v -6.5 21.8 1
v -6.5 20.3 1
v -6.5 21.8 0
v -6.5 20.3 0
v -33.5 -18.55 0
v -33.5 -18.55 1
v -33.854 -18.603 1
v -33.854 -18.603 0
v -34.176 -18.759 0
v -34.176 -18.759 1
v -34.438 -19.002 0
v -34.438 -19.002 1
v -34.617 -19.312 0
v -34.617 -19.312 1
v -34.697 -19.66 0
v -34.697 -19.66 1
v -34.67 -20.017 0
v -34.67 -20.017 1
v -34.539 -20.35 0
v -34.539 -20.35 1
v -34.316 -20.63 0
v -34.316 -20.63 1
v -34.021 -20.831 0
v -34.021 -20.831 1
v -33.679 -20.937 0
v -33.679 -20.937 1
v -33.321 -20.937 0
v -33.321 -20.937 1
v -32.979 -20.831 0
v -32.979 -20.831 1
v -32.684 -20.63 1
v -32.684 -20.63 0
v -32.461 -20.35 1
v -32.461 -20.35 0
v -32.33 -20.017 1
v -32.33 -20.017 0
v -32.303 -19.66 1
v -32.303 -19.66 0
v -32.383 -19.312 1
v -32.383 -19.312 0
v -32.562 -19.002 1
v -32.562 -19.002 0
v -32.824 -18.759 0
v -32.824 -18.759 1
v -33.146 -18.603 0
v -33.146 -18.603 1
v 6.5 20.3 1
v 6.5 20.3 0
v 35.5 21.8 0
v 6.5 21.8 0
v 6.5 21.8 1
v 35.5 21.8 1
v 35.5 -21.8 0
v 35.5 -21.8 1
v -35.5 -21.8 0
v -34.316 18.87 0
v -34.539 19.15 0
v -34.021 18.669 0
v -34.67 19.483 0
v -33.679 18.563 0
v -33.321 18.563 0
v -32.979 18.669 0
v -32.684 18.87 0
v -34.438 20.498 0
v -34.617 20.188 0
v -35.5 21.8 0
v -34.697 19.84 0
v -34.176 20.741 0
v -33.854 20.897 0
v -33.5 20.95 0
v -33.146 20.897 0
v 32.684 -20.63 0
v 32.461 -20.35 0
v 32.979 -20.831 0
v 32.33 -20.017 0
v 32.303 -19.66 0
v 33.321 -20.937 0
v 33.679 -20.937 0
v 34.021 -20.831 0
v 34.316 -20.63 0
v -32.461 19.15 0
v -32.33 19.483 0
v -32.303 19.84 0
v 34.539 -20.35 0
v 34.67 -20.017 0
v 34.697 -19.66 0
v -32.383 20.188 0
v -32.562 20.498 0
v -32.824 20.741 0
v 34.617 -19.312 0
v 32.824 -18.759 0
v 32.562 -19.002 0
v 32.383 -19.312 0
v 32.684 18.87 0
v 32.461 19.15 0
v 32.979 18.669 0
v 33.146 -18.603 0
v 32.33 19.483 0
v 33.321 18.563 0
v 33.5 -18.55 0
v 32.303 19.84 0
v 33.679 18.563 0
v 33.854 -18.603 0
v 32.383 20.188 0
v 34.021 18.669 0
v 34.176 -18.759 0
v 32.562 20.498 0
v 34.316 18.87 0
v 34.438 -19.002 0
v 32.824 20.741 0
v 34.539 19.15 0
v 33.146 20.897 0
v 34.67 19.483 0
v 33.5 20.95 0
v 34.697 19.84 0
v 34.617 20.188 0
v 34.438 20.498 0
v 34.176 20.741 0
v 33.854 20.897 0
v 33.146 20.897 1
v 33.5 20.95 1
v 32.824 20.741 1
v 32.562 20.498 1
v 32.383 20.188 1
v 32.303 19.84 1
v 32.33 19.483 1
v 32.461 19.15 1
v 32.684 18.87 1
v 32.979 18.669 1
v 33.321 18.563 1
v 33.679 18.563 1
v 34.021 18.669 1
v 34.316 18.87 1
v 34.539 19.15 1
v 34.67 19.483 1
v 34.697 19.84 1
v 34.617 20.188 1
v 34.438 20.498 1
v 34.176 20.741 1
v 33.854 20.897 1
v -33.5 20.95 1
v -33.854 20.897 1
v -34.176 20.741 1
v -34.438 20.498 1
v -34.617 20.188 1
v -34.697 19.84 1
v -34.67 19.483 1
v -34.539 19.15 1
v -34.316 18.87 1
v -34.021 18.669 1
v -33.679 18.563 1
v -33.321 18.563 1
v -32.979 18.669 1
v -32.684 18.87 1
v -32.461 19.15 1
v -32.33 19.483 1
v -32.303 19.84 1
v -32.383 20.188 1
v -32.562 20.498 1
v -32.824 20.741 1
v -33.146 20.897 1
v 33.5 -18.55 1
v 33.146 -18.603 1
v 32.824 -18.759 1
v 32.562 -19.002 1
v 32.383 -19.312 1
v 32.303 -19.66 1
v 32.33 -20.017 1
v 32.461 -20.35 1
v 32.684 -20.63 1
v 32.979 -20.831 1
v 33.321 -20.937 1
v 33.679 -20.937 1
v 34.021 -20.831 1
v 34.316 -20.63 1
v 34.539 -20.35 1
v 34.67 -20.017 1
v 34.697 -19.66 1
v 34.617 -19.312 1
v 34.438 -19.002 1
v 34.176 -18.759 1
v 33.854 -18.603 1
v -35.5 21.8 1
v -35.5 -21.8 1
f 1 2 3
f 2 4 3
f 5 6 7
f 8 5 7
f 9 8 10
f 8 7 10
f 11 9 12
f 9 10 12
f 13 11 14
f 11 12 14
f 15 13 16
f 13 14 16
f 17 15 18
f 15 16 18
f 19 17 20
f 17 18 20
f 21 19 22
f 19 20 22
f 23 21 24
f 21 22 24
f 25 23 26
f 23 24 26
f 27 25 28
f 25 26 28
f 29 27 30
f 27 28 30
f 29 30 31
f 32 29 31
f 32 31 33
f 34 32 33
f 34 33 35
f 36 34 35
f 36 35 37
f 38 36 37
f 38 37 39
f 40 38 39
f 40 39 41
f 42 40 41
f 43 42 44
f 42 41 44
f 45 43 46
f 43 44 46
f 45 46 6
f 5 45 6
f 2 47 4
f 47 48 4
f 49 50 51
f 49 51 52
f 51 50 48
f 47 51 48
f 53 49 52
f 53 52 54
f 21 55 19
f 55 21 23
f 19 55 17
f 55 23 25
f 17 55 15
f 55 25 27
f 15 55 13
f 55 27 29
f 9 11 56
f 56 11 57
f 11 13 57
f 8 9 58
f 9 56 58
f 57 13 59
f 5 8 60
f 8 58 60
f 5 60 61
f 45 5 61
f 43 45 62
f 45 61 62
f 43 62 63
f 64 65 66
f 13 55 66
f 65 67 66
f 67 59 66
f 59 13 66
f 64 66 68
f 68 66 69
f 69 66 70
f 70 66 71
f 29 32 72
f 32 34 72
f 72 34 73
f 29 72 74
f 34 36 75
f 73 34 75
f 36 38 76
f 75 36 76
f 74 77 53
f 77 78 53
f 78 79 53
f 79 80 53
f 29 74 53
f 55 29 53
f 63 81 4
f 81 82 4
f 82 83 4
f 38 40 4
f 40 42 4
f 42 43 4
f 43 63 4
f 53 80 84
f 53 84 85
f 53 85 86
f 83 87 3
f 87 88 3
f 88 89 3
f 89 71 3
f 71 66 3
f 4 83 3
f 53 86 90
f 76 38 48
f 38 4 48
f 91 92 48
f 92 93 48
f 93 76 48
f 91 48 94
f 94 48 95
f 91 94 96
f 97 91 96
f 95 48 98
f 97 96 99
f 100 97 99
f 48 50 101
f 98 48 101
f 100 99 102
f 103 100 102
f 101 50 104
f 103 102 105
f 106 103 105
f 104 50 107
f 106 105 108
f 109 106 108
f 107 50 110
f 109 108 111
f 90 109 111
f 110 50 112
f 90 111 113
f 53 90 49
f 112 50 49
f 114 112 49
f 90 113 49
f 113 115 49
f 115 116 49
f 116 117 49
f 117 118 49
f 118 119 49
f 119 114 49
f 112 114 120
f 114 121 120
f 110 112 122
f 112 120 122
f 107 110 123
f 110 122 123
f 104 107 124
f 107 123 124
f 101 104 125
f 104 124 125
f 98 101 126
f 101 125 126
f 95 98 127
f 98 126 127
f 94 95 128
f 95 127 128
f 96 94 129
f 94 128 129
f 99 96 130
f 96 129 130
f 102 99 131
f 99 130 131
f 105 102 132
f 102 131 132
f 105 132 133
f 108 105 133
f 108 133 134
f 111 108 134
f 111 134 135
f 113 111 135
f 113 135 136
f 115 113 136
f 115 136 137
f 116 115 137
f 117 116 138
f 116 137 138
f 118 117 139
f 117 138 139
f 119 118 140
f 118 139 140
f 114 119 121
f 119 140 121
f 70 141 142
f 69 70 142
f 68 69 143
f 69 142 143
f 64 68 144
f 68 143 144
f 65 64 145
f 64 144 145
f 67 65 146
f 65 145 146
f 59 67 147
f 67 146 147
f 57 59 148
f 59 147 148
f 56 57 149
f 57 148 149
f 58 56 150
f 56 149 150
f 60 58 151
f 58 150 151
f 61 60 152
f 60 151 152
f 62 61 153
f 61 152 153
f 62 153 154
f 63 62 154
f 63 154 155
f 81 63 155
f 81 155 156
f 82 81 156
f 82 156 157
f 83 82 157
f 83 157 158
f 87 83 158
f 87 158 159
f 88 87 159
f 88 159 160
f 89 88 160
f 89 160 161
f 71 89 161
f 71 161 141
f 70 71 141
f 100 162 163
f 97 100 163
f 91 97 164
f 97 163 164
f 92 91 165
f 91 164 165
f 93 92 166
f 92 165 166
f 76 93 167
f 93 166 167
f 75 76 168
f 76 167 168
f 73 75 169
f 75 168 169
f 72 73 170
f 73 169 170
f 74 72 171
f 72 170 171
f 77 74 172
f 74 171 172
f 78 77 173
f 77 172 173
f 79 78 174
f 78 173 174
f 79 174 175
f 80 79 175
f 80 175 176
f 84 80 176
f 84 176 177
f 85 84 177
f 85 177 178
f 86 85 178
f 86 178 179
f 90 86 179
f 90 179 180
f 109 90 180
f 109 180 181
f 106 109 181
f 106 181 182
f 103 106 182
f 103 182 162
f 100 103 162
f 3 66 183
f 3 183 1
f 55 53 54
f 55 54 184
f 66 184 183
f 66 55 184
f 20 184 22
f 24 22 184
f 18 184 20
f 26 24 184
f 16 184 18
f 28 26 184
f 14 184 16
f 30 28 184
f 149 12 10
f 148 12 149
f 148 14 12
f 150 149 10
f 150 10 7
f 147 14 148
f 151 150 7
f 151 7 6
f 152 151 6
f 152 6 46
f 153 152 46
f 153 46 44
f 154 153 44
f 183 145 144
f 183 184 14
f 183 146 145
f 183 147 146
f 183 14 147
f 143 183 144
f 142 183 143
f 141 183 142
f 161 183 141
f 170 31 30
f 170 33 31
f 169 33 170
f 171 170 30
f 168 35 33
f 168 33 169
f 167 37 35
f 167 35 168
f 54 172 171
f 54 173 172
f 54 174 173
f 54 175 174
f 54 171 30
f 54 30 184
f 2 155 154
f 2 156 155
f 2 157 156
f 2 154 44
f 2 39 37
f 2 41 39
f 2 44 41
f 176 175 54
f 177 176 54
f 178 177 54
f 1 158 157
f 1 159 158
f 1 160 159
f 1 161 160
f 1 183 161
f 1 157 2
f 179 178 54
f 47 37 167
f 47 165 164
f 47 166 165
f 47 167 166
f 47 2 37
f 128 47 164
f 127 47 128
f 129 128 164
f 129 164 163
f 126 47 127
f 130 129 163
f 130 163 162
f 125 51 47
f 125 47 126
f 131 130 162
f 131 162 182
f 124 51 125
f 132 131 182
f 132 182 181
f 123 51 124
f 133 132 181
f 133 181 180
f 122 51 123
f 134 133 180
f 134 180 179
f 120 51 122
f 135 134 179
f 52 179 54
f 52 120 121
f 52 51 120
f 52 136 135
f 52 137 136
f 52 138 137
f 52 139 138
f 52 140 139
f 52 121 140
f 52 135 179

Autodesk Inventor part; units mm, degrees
ref_plane "YZ Plane" through (0, 0, 0) normal (1, 0, 0) x (0, 1, 0)
ref_plane "XZ Plane" through (0, 0, 0) normal (0, 1, 0) x (-1, 0, 0)
ref_plane "XY Plane" through (0, 0, 0) normal (0, 0, 1) x (1, 0, 0)
sketch "Sketch1" plane through (0, 0, 0) normal (0, 0, 1) x (1, 0, 0)
  line L0 (-35.5, 21.8) -> (35.5, 21.8)
  line L1 (35.5, 21.8) -> (35.5, -21.8)
  line L2 (35.5, -21.8) -> (-35.5, -21.8)
  line L3 (-35.5, -21.8) -> (-35.5, 21.8)
  line L4 (-6.5, 21.8) -> (6.5, 21.8)
  line L5 (6.5, 21.8) -> (6.5, 20.3)
  line L6 (6.5, 20.3) -> (-6.5, 20.3)
  line L7 (-6.5, 20.3) -> (-6.5, 21.8)
  line L8 (-33.5, 19.75) -> (33.5, 19.75) construction
  line L9 (33.5, 19.75) -> (33.5, -19.75) construction
  line L10 (33.5, -19.75) -> (-33.5, -19.75) construction
  line L11 (-33.5, -19.75) -> (-33.5, 19.75) construction
  point P0 (0, 0)
  point P1 (0, 21.8)
  point P2 (35.5, 0)
  point P3 (0, 20.3)
  point P4 (33.5, 0)
  point P5 (0, -19.75)
  dimension "d0" = 43.6
  dimension "d1" = 71
  dimension "d2" = 13
  dimension "d3" = 1.5
  dimension "d4" = 67
  dimension "d5" = 39.5
extrude "Extrusion1" add sketch "Sketch1" along normal blind 1 contours L0 L7 L6 L5 L1 L2 L3
hole "Hole1" at (-33.5, 19.75, 0) at (33.5, 19.75, 0) at (33.5, -19.75, 0) at (-33.5, -19.75, 0) direction (0, 0, 1) diameter 2.4 end through all
properties part number "oled2.42-pcb"
